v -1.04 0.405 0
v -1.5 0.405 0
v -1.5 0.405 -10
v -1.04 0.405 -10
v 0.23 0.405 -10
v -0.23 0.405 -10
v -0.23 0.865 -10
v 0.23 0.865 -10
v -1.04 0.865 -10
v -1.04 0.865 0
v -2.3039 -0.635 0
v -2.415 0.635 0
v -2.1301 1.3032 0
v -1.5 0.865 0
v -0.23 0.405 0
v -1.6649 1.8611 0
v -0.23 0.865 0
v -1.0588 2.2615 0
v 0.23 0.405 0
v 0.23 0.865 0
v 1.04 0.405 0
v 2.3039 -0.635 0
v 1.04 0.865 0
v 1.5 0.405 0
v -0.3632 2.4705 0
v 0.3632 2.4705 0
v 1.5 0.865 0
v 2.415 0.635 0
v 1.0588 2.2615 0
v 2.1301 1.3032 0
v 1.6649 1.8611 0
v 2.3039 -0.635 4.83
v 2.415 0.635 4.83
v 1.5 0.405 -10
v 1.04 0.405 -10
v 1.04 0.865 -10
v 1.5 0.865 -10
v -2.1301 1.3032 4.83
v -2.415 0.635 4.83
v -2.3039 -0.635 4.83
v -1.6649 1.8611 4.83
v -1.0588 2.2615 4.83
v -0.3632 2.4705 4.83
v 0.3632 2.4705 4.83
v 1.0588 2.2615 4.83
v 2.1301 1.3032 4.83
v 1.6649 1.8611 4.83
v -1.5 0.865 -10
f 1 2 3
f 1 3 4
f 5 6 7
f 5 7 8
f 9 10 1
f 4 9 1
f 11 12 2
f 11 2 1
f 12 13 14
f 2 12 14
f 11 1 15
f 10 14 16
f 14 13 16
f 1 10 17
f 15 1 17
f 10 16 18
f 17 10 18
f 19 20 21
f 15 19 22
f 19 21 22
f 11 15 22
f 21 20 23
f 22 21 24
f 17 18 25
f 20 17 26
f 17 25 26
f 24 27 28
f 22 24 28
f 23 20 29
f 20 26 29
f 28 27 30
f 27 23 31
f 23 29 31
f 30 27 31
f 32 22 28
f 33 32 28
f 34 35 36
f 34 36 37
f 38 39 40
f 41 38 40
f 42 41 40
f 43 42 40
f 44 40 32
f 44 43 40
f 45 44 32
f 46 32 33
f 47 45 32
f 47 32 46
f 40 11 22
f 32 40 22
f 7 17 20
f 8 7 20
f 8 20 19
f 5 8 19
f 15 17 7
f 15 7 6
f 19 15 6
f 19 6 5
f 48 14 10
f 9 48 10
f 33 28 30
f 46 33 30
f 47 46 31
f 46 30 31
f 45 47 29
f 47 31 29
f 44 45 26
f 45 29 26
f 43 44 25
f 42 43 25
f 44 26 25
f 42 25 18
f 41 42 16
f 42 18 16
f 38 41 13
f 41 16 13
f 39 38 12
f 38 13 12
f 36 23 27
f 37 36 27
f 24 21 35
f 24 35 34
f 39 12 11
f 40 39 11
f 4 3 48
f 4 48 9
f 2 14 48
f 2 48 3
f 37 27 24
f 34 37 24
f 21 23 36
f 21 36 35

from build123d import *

# Parameters (mm, degrees)
F1_DEPTH = 4.83
F2_W     = 0.46
F2_H     = 0.46
F3_DEPTH = 10


with BuildPart() as f1:
    # F0 (on Top) → F1 (new body)
    with BuildSketch(Plane.XY):
        with BuildLine():
            ThreePointArc((2.415, 0.635), (0, 2.497088), (-2.415, 0.635))
            Line((-2.415, 0.635), (-2.303889, -0.635))
            Line((-2.303889, -0.635), (2.303889, -0.635))
            Line((2.303889, -0.635), (2.415, 0.635))
        make_face()
    extrude(amount=F1_DEPTH)

    # F2 (on face) → F3 (join)
    with BuildSketch(Plane(origin=(0, 0, 0), x_dir=(1, 0, 0), z_dir=(0, 0, -1))):
        with Locations((0, -0.635)):
            Rectangle(F2_W, F2_H)
        with Locations((1.27, -0.635)):
            Rectangle(F2_W, F2_H)
        with Locations((-1.27, -0.635)):
            Rectangle(F2_W, F2_H)
    extrude(amount=F3_DEPTH)


solid = f1.part
